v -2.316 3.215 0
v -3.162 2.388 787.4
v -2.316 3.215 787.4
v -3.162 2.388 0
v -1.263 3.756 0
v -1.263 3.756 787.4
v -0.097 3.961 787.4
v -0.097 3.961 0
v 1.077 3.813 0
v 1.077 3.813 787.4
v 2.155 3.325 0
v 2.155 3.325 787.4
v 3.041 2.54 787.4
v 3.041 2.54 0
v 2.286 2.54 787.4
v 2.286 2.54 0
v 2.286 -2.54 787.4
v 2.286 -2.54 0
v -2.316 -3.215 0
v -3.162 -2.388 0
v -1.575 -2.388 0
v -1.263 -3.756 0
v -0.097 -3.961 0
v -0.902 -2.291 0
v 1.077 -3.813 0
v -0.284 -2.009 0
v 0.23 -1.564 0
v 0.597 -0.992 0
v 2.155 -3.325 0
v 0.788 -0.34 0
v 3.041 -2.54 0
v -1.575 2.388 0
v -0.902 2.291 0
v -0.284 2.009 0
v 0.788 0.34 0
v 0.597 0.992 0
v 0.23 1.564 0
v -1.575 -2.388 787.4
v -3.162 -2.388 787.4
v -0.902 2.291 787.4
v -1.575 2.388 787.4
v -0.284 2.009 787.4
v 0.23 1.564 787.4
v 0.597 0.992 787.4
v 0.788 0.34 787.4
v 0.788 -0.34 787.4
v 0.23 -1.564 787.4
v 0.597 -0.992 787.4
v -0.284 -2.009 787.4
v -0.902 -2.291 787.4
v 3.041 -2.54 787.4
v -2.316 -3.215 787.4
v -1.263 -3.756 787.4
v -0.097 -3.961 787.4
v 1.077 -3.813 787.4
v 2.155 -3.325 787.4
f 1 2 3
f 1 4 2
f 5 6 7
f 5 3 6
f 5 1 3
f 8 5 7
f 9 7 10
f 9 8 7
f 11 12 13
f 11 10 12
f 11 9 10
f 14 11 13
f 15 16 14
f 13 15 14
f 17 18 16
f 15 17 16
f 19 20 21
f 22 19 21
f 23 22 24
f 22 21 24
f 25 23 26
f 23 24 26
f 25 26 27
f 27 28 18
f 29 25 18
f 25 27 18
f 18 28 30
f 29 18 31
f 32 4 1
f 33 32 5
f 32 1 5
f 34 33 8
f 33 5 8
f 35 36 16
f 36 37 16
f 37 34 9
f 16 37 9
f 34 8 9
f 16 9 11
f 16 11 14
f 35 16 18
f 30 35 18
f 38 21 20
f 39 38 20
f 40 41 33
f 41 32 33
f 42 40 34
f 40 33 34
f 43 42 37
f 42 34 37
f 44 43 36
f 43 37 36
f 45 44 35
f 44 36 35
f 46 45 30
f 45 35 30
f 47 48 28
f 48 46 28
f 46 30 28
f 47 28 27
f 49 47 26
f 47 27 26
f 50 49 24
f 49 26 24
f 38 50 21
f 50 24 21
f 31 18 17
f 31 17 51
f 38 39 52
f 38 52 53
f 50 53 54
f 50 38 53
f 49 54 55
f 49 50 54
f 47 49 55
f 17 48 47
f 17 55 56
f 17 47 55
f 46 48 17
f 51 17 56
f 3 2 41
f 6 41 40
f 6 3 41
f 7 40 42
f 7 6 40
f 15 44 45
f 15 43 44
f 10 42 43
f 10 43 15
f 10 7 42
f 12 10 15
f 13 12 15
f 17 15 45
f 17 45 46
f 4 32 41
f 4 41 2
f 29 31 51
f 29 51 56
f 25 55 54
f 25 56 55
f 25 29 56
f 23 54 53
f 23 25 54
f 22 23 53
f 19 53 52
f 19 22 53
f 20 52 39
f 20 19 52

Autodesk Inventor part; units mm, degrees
ref_plane "YZ Plane" through (0, 0, 0) normal (1, 0, 0) x (0, 1, 0)
ref_plane "XZ Plane" through (0, 0, 0) normal (0, 1, 0) x (-1, 0, 0)
ref_plane "XY Plane" through (0, 0, 0) normal (0, 0, 1) x (1, 0, 0)
sketch "Sketch1" plane through (0, 0, 0) normal (0, 0, 1) x (1, 0, 0)
  arc A0 (-1.5748, -2.3876) -> (-1.5748, 2.3876) centre (-1.5748, 0) ccw
  line L0 (-1.5748, 2.3876) -> (-3.1623, 2.3876)
  line L1 (-1.5748, -2.3876) -> (-3.1623, -2.3876)
  line L2 (2.286, -2.54) -> (2.286, 2.54)
  line L3 (2.286, 2.54) -> (3.0412, 2.54)
  line L4 (2.286, -2.54) -> (3.0412, -2.54)
  arc A1 (-3.1623, -2.3876) -> (3.0412, -2.54) centre (0, 0) ccw
  arc A2 (3.0412, 2.54) -> (-3.1623, 2.3876) centre (0, 0) ccw
  point P0 (2.286, 0)
  dimension "d2" = 1.5748
  dimension "d3" = 5.08
  dimension "d4" = 2.286
  dimension "d5" = 3.9624
  dimension "d13" = 3.9624
  dimension "d14" = 0.1524
  dimension "d15" = 2.3876
extrude "Extrusion1" add sketch "Sketch1" along normal blind 787.4
sketch "Sketch2" plane through (0, 0, 787.4) normal (0, 0, 1) x (1, 0, 0)
  arc A0 (-1.5748, -2.3876) -> (-1.5748, 2.3876) centre (-1.5748, 0) ccw projected
  line L0 (-1.5748, -2.3876) -> (-3.1623, -2.3876) projected
  arc A1 (-3.1623, -2.3876) -> (3.0412, -2.54) centre (0, 0) ccw projected
  line L1 (3.0412, -2.54) -> (2.286, -2.54) projected
  line L2 (2.286, -2.54) -> (2.286, 2.54) projected
  line L3 (2.286, 2.54) -> (3.0412, 2.54) projected
  arc A2 (3.0412, 2.54) -> (-3.1623, 2.3876) centre (0, 0) ccw projected
  line L4 (-3.1623, 2.3876) -> (-1.5748, 2.3876) projected
sketch "Sketch3" plane through (0, 0, 787.4) normal (0, 0, 1) x (1, 0, 0)
  arc A0 (-1.5748, -2.3876) -> (-1.5748, 2.3876) centre (-1.5748, 0) ccw projected
  line L0 (-1.5748, -2.3876) -> (-3.1623, -2.3876) projected
  arc A1 (-3.1623, -2.3876) -> (3.0412, -2.54) centre (0, 0) ccw projected
  line L1 (3.0412, -2.54) -> (2.286, -2.54) projected
  line L2 (2.286, -2.54) -> (2.286, 2.54) projected
  line L3 (2.286, 2.54) -> (3.0412, 2.54) projected
  arc A2 (3.0412, 2.54) -> (-3.1623, 2.3876) centre (0, 0) ccw projected
  line L4 (-3.1623, 2.3876) -> (-1.5748, 2.3876) projected
sketch "Sketch4" plane through (0, 0, 787.4) normal (0, 0, 1) x (1, 0, 0)
  arc A0 (-1.5748, -2.3876) -> (-1.5748, 2.3876) centre (-1.5748, 0) ccw projected
  line L0 (-1.5748, -2.3876) -> (-3.1623, -2.3876) projected
  arc A1 (-3.1623, -2.3876) -> (3.0412, -2.54) centre (0, 0) ccw projected
  line L1 (3.0412, -2.54) -> (2.286, -2.54) projected
  line L2 (2.286, -2.54) -> (2.286, 2.54) projected
  line L3 (2.286, 2.54) -> (3.0412, 2.54) projected
  arc A2 (3.0412, 2.54) -> (-3.1623, 2.3876) centre (0, 0) ccw projected
  line L4 (-3.1623, 2.3876) -> (-1.5748, 2.3876) projected
properties part number "thin rod" material "Polyethylene, High Density"
